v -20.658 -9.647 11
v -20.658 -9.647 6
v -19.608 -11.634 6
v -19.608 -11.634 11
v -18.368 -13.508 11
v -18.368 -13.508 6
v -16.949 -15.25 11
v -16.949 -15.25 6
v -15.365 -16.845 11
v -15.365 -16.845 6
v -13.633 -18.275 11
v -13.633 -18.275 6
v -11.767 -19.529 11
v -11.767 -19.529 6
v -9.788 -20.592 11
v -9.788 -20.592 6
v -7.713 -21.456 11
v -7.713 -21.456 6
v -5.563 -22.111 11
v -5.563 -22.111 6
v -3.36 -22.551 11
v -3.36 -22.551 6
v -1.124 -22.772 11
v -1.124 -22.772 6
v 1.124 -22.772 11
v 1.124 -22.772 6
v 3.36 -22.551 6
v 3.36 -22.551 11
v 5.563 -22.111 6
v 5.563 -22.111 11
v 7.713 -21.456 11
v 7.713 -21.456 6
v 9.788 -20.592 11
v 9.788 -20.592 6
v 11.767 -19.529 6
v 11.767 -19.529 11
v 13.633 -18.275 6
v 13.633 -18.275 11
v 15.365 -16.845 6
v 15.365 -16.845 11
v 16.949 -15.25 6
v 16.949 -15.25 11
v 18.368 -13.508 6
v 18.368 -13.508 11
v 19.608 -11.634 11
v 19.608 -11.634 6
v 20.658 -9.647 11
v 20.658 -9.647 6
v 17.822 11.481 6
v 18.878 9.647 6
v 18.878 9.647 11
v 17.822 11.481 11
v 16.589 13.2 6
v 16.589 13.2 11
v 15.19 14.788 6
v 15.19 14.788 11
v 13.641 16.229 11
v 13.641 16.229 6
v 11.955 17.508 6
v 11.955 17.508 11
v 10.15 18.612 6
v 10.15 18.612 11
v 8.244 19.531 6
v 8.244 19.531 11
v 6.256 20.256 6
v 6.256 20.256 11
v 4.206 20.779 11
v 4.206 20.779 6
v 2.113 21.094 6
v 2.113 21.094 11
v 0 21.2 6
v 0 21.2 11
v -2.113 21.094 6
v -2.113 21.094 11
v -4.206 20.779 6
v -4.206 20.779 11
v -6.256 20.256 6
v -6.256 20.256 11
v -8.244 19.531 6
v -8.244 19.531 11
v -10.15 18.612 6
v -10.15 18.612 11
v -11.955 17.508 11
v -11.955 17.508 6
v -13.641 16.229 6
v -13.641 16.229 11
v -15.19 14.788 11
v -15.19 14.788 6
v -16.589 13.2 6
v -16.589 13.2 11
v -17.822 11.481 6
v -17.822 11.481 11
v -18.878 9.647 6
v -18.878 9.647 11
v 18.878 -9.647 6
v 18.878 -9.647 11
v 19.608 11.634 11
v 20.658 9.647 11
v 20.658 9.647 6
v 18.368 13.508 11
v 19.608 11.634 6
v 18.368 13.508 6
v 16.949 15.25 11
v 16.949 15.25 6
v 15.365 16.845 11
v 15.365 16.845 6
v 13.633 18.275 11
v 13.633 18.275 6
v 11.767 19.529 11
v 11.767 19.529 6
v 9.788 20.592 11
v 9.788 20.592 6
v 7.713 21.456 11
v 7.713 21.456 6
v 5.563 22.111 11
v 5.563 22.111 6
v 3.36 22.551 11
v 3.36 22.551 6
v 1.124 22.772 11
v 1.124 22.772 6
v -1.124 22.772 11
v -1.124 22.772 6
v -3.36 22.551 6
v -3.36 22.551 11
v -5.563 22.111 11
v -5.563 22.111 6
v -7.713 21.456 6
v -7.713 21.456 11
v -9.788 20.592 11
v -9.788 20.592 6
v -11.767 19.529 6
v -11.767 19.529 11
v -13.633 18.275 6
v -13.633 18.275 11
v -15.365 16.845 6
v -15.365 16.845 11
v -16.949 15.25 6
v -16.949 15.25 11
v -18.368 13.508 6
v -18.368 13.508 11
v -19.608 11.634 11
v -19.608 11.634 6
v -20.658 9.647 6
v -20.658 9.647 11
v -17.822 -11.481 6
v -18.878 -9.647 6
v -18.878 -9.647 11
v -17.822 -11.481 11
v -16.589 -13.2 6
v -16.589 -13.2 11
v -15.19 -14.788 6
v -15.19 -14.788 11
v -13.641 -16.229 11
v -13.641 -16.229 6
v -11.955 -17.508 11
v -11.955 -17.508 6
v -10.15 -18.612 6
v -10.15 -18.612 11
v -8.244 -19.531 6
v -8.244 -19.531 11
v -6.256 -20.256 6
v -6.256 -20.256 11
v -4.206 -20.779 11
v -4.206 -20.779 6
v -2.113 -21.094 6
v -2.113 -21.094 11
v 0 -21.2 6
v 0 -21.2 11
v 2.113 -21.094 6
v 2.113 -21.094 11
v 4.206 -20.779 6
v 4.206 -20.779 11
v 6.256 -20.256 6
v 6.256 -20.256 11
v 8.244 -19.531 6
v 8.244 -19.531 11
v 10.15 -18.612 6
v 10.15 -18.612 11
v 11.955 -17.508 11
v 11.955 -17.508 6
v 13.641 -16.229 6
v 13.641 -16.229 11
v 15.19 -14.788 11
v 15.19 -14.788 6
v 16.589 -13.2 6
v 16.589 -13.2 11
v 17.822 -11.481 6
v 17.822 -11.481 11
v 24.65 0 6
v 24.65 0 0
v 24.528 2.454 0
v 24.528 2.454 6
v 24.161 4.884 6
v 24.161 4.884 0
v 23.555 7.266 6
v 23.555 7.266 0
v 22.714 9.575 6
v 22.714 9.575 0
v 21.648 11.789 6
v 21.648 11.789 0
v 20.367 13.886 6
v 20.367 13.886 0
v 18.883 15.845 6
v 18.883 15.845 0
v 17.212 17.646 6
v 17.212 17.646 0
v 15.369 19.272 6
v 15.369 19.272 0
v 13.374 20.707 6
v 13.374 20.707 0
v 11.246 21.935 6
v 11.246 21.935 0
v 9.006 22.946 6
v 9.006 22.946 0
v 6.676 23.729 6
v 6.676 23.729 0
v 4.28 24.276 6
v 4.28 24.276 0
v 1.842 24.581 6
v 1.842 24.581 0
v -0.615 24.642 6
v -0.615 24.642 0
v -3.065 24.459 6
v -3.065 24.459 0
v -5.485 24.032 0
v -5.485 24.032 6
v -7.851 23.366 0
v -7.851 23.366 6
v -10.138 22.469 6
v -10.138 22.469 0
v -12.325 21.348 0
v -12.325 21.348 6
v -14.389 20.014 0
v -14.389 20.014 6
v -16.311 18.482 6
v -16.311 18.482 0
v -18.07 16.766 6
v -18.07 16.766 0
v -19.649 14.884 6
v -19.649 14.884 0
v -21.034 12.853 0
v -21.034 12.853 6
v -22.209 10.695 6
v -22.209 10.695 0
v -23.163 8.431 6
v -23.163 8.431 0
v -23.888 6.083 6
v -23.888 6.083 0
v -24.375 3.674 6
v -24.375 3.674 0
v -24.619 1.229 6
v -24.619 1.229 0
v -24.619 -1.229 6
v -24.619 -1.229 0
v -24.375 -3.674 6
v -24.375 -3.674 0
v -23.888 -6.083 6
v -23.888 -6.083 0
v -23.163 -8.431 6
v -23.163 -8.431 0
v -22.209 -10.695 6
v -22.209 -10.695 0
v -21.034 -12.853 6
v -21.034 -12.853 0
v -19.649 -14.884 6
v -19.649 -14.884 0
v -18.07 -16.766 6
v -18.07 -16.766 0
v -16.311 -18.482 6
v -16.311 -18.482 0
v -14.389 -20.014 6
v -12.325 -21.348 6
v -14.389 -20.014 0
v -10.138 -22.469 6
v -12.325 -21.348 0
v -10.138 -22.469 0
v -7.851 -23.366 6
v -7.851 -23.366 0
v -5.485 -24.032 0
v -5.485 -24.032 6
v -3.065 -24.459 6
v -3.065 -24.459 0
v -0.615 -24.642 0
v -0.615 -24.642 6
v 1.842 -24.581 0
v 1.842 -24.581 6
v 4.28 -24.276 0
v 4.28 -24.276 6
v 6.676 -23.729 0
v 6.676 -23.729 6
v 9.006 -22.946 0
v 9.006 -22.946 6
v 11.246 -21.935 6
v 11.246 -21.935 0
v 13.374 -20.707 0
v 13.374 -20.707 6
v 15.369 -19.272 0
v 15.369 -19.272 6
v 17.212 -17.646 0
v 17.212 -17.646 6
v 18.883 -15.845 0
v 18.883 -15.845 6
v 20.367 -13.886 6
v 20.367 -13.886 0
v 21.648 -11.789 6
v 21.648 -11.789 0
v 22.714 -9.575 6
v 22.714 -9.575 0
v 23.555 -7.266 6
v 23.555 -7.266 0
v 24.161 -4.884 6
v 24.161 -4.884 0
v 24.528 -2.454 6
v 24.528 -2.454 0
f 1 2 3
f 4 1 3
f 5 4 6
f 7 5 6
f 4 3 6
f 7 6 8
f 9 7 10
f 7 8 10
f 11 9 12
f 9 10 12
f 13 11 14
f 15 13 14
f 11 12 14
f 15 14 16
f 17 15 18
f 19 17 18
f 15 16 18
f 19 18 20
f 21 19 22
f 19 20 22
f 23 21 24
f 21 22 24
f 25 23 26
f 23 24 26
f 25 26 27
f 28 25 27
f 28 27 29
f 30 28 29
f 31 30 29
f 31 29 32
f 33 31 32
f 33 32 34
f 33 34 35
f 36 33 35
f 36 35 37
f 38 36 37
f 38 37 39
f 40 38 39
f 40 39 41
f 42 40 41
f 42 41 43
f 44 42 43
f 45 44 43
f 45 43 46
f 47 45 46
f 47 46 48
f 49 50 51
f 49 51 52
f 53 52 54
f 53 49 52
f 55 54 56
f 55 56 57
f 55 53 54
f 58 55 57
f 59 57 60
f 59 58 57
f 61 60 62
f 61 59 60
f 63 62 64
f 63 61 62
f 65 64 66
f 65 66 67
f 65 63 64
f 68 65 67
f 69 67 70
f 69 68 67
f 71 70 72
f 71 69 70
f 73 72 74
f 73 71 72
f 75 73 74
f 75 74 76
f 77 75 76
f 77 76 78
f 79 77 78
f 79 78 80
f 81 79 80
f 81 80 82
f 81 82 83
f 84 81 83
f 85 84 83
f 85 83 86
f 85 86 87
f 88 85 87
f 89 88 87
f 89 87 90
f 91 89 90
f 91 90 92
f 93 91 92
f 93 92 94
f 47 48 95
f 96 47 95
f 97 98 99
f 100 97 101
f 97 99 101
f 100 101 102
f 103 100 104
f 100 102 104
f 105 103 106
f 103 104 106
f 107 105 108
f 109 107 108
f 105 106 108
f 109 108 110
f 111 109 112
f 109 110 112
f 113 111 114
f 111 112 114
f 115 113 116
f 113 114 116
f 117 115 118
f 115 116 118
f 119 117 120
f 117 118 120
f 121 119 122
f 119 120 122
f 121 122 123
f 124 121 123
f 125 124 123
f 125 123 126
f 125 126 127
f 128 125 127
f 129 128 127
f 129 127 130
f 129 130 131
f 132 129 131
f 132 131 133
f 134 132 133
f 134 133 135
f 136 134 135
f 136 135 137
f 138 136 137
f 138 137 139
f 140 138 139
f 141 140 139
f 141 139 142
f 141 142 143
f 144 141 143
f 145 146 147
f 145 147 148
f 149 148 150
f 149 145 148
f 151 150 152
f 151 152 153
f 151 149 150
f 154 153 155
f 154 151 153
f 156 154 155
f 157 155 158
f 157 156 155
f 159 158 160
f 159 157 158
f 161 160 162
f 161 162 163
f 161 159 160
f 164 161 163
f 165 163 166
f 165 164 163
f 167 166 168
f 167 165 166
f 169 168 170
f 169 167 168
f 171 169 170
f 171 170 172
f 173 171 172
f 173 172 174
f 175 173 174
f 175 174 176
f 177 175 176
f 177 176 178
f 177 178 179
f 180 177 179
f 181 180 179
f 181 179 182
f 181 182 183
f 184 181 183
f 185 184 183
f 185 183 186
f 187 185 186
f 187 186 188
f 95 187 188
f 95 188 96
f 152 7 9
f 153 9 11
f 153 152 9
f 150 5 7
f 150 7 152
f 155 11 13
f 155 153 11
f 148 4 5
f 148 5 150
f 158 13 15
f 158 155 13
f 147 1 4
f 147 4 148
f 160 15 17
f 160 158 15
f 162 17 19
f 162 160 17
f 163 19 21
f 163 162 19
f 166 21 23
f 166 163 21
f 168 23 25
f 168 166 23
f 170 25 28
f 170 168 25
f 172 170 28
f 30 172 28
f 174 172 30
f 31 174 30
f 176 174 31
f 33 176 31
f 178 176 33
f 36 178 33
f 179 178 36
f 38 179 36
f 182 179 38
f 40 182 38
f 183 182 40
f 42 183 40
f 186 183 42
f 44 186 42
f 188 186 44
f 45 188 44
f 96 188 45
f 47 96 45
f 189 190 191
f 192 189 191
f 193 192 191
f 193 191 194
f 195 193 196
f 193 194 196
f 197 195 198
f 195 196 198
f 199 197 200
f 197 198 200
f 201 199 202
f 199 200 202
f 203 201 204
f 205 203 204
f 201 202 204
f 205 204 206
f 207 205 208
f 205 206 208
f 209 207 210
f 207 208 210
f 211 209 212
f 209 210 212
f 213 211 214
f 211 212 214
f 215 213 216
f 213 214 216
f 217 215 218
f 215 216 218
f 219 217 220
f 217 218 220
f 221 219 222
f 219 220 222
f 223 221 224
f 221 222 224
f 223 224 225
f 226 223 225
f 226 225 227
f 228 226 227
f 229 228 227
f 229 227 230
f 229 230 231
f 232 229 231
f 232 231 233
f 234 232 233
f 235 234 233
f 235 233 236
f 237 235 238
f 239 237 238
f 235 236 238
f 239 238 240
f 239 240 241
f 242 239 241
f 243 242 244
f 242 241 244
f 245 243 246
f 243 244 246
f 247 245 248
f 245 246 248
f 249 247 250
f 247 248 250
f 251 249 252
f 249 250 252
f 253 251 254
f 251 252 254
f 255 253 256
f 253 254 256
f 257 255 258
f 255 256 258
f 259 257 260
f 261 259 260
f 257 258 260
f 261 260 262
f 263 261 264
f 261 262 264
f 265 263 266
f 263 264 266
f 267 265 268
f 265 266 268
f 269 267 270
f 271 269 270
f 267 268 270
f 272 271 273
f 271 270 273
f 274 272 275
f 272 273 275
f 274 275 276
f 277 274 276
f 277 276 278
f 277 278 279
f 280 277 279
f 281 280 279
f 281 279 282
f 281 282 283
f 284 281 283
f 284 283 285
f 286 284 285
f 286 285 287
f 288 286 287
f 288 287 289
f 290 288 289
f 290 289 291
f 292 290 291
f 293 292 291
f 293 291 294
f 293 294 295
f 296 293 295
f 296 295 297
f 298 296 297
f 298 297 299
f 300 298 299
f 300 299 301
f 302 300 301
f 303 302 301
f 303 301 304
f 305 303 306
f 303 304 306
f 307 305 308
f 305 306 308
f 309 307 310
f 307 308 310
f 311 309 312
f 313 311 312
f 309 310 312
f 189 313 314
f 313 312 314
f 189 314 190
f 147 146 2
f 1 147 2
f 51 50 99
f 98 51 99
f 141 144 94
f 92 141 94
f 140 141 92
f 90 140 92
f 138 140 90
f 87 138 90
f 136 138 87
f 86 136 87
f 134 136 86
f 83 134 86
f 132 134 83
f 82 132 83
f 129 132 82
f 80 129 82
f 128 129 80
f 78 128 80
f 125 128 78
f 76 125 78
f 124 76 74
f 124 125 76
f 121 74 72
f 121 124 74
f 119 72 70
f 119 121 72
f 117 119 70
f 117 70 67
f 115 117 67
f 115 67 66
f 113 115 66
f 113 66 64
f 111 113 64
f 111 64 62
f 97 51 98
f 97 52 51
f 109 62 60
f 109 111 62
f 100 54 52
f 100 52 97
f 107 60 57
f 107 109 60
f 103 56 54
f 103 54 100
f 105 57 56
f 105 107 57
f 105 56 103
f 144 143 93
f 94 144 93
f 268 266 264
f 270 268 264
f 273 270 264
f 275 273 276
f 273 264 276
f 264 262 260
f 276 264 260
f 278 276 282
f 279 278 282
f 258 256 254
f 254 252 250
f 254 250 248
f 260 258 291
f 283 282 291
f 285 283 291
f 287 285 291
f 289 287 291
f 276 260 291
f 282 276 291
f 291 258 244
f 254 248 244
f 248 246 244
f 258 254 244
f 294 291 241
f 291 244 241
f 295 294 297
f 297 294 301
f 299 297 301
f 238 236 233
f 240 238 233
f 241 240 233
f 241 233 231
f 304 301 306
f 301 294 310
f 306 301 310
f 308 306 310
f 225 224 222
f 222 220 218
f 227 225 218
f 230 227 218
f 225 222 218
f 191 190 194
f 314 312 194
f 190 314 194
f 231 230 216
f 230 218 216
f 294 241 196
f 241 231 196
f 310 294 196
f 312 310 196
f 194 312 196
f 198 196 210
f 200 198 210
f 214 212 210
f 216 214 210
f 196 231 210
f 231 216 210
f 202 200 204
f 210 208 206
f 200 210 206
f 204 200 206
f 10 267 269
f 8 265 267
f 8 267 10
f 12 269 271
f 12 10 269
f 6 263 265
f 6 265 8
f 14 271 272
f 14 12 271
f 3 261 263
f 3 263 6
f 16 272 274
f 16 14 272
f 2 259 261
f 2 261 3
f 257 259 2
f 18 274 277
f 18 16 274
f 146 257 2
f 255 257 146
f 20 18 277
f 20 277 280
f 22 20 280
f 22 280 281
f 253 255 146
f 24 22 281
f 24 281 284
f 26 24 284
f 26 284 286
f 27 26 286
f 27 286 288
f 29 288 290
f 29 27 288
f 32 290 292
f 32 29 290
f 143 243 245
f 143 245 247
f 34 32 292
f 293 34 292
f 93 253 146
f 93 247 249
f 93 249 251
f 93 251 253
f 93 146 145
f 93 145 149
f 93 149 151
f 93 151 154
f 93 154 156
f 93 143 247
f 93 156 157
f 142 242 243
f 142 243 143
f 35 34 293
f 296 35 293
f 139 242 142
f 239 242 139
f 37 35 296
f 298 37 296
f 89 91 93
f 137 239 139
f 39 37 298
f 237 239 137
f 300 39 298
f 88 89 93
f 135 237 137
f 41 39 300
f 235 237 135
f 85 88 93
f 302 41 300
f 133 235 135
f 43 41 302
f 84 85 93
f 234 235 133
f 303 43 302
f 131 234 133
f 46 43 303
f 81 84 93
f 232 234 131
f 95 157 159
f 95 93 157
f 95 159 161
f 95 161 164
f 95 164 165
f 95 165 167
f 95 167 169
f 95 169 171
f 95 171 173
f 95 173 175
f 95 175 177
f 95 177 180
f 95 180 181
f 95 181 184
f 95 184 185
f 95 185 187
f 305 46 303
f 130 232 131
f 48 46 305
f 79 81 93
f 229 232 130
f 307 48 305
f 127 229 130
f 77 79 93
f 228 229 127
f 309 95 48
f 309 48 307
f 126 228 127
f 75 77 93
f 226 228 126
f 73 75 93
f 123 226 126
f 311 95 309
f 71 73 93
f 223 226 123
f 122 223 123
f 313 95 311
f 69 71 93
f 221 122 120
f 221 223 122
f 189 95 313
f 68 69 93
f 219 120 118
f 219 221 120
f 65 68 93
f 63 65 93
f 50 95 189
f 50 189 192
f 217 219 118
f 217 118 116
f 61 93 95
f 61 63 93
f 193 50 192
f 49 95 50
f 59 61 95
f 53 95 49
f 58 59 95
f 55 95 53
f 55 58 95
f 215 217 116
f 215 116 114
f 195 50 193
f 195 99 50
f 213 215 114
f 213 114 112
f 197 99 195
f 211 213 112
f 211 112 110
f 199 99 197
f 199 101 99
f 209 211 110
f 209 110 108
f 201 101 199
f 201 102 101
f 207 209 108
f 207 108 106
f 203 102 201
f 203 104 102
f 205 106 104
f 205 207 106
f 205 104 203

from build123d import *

# Parameters (mm, degrees)
SKETCH1_R           = 24.65
BOSS_EXTRUDE1_DEPTH = 6
SKETCH2_R           = 22.8
SKETCH2_R_2         = 21.2
BOSS_EXTRUDE2_DEPTH = 5
CUT_EXTRUDE1_START  = -5
CUT_EXTRUDE1_DEPTH  = 5


with BuildPart() as part:
    # Sketch1 → Boss-Extrude1 (new body)
    with BuildSketch(Plane.XY):
        Circle(SKETCH1_R)
    extrude(amount=BOSS_EXTRUDE1_DEPTH)

    # Sketch2 → Boss-Extrude2 (add)
    with BuildSketch(Plane.XY.offset(6)):
        Circle(SKETCH2_R)
        Circle(SKETCH2_R_2, mode=Mode.SUBTRACT)
    extrude(amount=BOSS_EXTRUDE2_DEPTH)

    # Sketch3 → Cut-Extrude1 (cut)
    with BuildSketch(Plane.XY.offset(11).offset(CUT_EXTRUDE1_START)):
        with BuildLine():
            Line((-20.658461767, 9.647173545), (-18.877818798, 9.647173545))
            ThreePointArc((-18.877818798, 9.647173545), (-21.2, 0), (-18.877818798, -9.647173545))
            Line((-18.877818798, -9.647173545), (-20.658461767, -9.647173545))
            ThreePointArc((-20.658461767, -9.647173545), (-22.8, 0), (-20.658461767, 9.647173545))
        make_face()
        with BuildLine():
            Line((20.658461767, -9.647173545), (18.877818798, -9.647173545))
            ThreePointArc((18.877818798, -9.647173545), (21.2, 0), (18.877818798, 9.647173545))
            Line((18.877818798, 9.647173545), (20.658461767, 9.647173545))
            ThreePointArc((20.658461767, 9.647173545), (22.8, 0), (20.658461767, -9.647173545))
        make_face()
    extrude(amount=CUT_EXTRUDE1_DEPTH, mode=Mode.SUBTRACT)


solid = part.part
